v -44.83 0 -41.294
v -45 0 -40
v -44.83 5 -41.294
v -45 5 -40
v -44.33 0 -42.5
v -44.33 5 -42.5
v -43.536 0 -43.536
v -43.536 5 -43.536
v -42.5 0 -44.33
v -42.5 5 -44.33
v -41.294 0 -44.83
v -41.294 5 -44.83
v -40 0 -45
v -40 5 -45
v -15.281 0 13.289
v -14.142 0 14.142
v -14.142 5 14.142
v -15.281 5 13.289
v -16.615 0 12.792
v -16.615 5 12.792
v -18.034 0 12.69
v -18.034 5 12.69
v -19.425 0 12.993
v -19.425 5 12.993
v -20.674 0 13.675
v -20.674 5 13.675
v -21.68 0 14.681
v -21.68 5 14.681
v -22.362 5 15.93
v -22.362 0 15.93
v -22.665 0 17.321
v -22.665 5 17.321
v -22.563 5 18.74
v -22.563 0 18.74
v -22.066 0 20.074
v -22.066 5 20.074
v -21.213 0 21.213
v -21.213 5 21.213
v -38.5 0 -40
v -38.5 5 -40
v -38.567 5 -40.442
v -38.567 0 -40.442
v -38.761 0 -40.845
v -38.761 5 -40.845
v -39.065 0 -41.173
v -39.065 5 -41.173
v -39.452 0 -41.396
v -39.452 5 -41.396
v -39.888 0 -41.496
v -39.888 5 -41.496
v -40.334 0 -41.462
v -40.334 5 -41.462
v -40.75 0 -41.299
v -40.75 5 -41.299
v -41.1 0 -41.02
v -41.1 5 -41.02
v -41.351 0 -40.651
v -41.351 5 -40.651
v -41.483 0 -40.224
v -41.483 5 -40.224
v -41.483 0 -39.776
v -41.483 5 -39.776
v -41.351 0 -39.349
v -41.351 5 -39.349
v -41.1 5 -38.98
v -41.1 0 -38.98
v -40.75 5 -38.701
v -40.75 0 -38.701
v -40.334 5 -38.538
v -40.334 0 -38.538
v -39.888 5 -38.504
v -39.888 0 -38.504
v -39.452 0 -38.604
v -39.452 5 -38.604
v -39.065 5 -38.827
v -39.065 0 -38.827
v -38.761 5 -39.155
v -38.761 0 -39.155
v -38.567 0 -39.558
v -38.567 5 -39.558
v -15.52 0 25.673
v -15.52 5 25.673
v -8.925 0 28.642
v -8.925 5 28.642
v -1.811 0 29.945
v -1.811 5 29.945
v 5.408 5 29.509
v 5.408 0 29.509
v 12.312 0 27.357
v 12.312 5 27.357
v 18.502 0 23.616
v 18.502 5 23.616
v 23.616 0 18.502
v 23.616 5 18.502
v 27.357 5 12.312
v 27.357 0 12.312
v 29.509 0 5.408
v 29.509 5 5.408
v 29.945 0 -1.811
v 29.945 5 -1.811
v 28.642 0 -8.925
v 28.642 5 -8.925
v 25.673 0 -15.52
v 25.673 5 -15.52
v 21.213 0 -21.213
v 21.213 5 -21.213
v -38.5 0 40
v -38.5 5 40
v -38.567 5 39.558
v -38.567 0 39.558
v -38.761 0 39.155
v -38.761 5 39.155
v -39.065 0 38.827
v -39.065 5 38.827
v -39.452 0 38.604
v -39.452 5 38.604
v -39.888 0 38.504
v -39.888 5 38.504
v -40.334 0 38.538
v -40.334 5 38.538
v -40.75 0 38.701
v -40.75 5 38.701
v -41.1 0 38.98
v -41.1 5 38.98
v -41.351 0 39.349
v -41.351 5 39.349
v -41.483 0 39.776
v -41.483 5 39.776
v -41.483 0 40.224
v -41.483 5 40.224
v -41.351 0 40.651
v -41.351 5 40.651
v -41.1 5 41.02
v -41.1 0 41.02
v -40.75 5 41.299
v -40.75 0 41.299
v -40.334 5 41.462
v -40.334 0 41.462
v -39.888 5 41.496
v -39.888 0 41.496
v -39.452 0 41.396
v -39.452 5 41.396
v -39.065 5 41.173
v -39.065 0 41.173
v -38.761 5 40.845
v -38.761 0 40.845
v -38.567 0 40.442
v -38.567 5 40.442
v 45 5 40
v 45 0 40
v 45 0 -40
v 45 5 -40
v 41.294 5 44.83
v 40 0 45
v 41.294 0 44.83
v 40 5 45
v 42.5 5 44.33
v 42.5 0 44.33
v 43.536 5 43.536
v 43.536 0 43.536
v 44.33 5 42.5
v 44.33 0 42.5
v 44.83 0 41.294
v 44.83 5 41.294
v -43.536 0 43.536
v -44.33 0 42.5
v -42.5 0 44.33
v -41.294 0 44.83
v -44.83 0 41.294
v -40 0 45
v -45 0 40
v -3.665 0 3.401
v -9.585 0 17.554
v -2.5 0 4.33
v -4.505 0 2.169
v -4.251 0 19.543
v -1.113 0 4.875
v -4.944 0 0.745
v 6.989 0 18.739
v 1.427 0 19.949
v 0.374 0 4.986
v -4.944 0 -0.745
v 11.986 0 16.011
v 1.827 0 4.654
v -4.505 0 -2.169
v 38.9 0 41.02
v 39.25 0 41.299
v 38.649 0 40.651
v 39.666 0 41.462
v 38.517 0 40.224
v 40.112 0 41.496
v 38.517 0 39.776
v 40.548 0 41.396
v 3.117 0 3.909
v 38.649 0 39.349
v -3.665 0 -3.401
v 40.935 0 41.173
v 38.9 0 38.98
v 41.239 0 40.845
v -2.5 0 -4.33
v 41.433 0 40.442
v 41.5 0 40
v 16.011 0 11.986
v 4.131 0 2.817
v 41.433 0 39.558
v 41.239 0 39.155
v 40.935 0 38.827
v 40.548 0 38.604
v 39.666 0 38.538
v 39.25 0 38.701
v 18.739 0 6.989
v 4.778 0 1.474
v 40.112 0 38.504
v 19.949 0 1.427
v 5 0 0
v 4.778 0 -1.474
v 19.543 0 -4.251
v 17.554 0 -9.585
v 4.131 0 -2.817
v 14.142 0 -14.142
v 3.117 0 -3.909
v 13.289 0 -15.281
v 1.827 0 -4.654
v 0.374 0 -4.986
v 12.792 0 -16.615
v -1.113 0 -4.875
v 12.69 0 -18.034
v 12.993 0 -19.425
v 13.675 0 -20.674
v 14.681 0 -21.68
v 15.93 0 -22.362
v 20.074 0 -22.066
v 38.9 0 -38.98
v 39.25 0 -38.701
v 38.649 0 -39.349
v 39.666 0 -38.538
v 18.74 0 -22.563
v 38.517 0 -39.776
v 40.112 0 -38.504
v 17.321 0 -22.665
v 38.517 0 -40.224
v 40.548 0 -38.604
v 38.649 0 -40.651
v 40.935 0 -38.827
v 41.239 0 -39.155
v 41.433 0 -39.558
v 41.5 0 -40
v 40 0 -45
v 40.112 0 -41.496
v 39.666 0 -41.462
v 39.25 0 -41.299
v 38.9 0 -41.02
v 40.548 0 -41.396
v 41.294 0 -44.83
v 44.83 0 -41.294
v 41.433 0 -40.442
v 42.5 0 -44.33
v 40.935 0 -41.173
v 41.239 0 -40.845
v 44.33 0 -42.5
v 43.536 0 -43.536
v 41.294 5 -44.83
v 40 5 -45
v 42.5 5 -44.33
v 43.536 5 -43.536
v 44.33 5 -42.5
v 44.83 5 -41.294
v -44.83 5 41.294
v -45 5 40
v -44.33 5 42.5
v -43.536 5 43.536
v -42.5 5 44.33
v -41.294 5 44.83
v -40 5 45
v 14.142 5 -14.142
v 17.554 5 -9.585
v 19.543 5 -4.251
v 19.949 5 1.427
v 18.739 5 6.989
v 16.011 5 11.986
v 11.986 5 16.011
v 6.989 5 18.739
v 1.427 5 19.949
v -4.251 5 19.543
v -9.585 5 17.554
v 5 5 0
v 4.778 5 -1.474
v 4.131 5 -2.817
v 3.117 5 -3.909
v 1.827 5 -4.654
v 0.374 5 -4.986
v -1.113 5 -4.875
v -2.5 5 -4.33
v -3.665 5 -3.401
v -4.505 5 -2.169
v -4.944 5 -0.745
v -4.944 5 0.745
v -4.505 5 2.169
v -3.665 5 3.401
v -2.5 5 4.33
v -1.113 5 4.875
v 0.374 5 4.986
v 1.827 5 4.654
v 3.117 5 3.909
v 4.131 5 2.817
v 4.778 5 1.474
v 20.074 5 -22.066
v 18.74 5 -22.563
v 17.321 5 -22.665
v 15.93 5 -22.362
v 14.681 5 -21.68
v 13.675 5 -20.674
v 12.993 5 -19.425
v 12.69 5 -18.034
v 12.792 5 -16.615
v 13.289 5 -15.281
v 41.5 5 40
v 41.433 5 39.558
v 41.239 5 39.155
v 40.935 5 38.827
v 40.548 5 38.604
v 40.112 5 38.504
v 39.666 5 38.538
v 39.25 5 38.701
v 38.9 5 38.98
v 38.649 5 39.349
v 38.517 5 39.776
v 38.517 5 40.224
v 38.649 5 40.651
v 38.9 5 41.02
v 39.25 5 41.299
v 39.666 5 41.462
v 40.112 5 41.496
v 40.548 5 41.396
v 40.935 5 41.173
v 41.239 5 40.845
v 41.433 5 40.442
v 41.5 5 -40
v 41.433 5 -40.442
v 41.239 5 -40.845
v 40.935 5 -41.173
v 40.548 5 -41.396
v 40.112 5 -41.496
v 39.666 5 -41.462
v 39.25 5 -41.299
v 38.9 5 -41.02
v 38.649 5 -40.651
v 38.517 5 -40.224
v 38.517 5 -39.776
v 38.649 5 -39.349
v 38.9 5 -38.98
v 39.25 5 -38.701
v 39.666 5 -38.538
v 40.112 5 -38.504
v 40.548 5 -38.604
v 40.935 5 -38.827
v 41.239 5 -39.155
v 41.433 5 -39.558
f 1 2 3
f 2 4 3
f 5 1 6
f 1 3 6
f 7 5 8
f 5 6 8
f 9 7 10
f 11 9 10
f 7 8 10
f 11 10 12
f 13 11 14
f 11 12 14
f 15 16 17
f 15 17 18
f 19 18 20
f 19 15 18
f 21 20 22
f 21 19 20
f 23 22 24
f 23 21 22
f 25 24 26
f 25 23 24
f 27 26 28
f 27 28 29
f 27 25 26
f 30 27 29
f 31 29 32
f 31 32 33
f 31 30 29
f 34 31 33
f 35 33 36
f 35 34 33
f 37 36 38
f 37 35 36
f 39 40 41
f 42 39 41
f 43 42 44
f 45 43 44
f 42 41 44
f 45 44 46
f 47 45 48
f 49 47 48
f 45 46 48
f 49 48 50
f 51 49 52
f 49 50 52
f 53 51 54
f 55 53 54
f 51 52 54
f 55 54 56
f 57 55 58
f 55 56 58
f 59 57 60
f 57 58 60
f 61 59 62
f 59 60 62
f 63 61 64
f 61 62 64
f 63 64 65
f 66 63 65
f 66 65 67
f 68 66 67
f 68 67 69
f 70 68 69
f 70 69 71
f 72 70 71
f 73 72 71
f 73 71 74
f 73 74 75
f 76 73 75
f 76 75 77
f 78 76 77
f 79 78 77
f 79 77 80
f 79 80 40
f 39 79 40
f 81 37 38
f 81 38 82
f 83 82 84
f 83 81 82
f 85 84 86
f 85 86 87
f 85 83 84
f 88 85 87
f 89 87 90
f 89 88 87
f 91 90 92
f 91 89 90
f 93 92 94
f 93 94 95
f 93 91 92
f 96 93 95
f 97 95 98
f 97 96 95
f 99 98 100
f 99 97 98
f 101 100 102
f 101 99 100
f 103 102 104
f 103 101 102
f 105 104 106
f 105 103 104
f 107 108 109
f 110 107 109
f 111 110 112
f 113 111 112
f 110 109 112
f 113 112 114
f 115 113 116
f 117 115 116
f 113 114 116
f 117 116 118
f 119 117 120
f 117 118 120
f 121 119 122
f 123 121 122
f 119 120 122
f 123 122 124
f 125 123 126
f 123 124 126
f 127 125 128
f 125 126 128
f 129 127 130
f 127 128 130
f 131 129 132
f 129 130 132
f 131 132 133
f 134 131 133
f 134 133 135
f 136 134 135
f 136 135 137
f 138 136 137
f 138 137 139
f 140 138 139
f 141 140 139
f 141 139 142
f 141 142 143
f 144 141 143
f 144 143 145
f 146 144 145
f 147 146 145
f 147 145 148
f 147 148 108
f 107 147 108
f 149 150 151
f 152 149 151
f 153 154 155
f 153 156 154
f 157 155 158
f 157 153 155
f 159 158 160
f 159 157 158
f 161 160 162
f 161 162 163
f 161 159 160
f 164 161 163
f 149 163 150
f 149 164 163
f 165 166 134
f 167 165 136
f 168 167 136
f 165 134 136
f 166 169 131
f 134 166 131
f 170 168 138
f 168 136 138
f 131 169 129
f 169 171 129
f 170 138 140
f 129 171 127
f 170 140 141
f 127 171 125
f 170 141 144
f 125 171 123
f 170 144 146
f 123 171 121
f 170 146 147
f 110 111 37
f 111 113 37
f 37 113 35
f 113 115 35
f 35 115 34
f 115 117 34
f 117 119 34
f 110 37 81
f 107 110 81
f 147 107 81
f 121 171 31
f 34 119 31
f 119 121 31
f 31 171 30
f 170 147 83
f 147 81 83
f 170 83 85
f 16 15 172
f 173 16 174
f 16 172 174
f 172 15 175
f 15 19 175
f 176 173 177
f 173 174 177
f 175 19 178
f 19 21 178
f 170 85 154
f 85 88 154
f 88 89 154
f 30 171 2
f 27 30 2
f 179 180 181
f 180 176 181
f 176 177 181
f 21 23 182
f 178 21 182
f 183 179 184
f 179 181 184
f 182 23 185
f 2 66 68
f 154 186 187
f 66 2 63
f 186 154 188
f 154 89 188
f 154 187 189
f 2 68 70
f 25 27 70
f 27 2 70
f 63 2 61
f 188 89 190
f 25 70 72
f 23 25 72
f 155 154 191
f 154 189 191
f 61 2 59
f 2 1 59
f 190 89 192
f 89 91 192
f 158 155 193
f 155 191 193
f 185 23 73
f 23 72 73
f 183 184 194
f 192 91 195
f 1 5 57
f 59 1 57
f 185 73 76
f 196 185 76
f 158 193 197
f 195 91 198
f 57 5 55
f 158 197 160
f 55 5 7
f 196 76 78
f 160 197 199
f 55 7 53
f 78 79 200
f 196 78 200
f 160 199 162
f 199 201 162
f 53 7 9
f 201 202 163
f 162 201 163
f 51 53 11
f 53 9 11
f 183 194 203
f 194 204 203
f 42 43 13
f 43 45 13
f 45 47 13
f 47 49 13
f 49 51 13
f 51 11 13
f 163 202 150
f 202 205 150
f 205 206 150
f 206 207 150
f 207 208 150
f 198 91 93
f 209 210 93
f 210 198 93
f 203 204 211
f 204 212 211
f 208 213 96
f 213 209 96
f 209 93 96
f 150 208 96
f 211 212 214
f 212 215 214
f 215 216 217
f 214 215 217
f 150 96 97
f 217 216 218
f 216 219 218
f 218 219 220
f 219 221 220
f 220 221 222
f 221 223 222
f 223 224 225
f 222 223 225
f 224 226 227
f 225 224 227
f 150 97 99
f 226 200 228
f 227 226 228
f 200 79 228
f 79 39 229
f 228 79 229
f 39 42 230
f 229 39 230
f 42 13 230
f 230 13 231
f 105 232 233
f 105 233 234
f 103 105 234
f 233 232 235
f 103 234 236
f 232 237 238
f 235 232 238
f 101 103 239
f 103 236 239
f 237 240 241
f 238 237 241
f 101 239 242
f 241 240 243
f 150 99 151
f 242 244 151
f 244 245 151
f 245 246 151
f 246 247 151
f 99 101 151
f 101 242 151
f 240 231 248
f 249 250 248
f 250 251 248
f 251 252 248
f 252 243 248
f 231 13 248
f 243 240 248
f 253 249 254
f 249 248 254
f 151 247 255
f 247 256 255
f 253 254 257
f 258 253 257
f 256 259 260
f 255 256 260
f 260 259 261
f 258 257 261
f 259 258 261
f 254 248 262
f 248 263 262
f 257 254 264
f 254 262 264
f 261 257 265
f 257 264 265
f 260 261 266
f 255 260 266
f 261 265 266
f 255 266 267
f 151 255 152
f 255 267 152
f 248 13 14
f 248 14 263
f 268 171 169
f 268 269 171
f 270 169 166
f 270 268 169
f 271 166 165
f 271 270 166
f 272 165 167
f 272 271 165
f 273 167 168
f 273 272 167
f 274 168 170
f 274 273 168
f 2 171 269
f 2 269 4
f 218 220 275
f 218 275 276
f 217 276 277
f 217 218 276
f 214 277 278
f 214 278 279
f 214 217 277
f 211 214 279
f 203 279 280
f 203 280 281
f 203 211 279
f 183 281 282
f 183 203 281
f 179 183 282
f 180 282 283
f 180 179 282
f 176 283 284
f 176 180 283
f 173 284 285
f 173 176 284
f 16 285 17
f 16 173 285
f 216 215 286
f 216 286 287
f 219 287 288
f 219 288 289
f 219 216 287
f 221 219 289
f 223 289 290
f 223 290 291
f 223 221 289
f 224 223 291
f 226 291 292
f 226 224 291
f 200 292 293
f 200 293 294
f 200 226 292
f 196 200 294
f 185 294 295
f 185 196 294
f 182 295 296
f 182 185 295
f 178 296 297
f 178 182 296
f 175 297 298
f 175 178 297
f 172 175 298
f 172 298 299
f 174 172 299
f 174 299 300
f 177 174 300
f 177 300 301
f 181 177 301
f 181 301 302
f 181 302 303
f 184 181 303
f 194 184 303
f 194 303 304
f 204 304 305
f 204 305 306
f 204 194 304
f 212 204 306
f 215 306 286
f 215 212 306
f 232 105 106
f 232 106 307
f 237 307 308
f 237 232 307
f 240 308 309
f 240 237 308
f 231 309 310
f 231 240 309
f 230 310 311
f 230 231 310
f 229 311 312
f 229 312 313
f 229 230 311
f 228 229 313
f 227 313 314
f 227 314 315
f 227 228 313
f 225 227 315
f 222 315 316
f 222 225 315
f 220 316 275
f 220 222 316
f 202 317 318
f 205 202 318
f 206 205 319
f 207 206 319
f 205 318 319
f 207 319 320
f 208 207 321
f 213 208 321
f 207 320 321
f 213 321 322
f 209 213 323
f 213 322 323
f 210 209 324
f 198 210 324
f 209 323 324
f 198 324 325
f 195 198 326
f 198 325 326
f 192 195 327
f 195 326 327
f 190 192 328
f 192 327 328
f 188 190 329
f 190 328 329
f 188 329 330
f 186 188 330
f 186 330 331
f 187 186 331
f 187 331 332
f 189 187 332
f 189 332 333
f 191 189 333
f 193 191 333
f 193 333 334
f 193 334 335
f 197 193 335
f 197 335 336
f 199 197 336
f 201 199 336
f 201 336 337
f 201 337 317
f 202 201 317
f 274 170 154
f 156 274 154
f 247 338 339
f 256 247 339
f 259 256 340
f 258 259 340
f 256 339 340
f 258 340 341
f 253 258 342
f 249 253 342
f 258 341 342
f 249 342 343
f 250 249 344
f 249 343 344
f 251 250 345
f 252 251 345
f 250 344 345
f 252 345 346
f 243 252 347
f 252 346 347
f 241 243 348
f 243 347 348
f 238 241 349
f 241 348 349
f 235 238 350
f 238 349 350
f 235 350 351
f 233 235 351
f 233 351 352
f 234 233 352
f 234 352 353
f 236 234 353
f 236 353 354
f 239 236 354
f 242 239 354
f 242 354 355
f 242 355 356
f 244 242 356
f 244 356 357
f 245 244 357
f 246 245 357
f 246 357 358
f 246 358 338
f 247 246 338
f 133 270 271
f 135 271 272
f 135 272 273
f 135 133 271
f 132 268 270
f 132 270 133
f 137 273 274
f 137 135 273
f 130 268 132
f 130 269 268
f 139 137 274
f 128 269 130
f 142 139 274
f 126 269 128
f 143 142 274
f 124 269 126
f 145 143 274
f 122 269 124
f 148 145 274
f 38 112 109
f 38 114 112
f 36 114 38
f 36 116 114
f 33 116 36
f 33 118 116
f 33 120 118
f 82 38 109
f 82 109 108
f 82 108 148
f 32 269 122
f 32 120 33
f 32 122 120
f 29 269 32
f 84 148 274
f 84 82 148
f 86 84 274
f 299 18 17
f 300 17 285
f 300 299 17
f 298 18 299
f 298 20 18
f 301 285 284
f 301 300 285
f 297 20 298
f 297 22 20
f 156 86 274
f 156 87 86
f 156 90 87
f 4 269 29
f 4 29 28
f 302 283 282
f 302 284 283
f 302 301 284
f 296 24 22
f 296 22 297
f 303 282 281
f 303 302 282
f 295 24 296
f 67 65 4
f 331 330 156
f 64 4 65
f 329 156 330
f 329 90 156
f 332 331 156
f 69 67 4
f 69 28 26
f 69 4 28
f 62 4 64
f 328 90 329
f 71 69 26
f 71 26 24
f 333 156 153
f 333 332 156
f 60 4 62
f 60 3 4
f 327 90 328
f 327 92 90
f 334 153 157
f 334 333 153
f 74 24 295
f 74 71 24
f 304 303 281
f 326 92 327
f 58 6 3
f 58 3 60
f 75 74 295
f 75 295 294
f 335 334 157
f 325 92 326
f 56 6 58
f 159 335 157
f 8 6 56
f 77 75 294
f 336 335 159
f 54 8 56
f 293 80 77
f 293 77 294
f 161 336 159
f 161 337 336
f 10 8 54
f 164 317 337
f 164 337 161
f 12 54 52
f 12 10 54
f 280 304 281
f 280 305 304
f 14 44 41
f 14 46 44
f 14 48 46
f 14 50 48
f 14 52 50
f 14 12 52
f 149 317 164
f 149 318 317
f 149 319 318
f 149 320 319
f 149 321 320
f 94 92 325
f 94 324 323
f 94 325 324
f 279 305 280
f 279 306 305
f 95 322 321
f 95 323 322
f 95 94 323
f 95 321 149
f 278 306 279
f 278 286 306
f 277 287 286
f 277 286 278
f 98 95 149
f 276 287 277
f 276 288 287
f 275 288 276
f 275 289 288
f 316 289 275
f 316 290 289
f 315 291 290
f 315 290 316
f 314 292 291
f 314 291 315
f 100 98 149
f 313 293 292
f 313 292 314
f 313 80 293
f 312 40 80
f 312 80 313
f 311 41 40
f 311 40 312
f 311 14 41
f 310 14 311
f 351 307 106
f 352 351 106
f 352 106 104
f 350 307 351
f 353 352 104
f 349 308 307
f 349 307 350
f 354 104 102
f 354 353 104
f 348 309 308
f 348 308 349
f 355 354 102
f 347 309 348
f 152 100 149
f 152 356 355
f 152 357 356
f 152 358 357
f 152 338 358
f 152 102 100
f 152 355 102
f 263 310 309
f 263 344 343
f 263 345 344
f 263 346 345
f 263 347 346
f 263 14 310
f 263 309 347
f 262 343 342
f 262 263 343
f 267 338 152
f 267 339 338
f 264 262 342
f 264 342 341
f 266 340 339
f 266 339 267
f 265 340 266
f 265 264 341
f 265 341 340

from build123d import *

# Parameters (mm, degrees)
SKETCH1_W           = 90
SKETCH1_H           = 90
SKETCH1_R           = 5
BOSS_EXTRUDE1_DEPTH = 5
SKETCH2_R           = 1.5
CUT_EXTRUDE1_DEPTH  = 6
FILLET1_R           = 5


with BuildPart() as part:
    # Sketch1 → Boss-Extrude1 (new body)
    with BuildSketch(Plane(origin=(0, 0, 0), x_dir=(1, 0, 0), z_dir=(0, 1, 0))):
        Rectangle(SKETCH1_W, SKETCH1_H)
        Circle(SKETCH1_R, mode=Mode.SUBTRACT)
        with BuildLine():
            ThreePointArc((-21.213203436, -21.213203436), (21.213203436, -21.213203436), (21.213203436, 21.213203436))
            ThreePointArc((21.213203436, 21.213203436), (14.142135624, 21.213203436), (14.142135624, 14.142135624))
            ThreePointArc((14.142135624, 14.142135624), (14.142135624, -14.142135624), (-14.142135624, -14.142135624))
            ThreePointArc((-14.142135624, -14.142135624), (-21.213203436, -14.142135624), (-21.213203436, -21.213203436))
        make_face(mode=Mode.SUBTRACT)
    extrude(amount=BOSS_EXTRUDE1_DEPTH)

    # Sketch2 → Cut-Extrude1 (cut, through all)
    with BuildSketch(Plane(origin=(0, 5, 0), x_dir=(1, 0, 0), z_dir=(0, 1, 0))):
        with Locations((-40, 40)):
            Circle(SKETCH2_R)
        with Locations((40, 40)):
            Circle(SKETCH2_R)
        with Locations((40, -40)):
            Circle(SKETCH2_R)
        with Locations((-40, -40)):
            Circle(SKETCH2_R)
    extrude(amount=-CUT_EXTRUDE1_DEPTH, mode=Mode.SUBTRACT)

    # Fillet1
    fillet1_edges = [part.edges().sort_by_distance(p)[0] for p in [
        (45, 2.5, 45),
        (-45, 2.5, 45),
        (-45, 2.5, -45),
        (45, 2.5, -45),
    ]]
    fillet(fillet1_edges, radius=FILLET1_R)


solid = part.part
